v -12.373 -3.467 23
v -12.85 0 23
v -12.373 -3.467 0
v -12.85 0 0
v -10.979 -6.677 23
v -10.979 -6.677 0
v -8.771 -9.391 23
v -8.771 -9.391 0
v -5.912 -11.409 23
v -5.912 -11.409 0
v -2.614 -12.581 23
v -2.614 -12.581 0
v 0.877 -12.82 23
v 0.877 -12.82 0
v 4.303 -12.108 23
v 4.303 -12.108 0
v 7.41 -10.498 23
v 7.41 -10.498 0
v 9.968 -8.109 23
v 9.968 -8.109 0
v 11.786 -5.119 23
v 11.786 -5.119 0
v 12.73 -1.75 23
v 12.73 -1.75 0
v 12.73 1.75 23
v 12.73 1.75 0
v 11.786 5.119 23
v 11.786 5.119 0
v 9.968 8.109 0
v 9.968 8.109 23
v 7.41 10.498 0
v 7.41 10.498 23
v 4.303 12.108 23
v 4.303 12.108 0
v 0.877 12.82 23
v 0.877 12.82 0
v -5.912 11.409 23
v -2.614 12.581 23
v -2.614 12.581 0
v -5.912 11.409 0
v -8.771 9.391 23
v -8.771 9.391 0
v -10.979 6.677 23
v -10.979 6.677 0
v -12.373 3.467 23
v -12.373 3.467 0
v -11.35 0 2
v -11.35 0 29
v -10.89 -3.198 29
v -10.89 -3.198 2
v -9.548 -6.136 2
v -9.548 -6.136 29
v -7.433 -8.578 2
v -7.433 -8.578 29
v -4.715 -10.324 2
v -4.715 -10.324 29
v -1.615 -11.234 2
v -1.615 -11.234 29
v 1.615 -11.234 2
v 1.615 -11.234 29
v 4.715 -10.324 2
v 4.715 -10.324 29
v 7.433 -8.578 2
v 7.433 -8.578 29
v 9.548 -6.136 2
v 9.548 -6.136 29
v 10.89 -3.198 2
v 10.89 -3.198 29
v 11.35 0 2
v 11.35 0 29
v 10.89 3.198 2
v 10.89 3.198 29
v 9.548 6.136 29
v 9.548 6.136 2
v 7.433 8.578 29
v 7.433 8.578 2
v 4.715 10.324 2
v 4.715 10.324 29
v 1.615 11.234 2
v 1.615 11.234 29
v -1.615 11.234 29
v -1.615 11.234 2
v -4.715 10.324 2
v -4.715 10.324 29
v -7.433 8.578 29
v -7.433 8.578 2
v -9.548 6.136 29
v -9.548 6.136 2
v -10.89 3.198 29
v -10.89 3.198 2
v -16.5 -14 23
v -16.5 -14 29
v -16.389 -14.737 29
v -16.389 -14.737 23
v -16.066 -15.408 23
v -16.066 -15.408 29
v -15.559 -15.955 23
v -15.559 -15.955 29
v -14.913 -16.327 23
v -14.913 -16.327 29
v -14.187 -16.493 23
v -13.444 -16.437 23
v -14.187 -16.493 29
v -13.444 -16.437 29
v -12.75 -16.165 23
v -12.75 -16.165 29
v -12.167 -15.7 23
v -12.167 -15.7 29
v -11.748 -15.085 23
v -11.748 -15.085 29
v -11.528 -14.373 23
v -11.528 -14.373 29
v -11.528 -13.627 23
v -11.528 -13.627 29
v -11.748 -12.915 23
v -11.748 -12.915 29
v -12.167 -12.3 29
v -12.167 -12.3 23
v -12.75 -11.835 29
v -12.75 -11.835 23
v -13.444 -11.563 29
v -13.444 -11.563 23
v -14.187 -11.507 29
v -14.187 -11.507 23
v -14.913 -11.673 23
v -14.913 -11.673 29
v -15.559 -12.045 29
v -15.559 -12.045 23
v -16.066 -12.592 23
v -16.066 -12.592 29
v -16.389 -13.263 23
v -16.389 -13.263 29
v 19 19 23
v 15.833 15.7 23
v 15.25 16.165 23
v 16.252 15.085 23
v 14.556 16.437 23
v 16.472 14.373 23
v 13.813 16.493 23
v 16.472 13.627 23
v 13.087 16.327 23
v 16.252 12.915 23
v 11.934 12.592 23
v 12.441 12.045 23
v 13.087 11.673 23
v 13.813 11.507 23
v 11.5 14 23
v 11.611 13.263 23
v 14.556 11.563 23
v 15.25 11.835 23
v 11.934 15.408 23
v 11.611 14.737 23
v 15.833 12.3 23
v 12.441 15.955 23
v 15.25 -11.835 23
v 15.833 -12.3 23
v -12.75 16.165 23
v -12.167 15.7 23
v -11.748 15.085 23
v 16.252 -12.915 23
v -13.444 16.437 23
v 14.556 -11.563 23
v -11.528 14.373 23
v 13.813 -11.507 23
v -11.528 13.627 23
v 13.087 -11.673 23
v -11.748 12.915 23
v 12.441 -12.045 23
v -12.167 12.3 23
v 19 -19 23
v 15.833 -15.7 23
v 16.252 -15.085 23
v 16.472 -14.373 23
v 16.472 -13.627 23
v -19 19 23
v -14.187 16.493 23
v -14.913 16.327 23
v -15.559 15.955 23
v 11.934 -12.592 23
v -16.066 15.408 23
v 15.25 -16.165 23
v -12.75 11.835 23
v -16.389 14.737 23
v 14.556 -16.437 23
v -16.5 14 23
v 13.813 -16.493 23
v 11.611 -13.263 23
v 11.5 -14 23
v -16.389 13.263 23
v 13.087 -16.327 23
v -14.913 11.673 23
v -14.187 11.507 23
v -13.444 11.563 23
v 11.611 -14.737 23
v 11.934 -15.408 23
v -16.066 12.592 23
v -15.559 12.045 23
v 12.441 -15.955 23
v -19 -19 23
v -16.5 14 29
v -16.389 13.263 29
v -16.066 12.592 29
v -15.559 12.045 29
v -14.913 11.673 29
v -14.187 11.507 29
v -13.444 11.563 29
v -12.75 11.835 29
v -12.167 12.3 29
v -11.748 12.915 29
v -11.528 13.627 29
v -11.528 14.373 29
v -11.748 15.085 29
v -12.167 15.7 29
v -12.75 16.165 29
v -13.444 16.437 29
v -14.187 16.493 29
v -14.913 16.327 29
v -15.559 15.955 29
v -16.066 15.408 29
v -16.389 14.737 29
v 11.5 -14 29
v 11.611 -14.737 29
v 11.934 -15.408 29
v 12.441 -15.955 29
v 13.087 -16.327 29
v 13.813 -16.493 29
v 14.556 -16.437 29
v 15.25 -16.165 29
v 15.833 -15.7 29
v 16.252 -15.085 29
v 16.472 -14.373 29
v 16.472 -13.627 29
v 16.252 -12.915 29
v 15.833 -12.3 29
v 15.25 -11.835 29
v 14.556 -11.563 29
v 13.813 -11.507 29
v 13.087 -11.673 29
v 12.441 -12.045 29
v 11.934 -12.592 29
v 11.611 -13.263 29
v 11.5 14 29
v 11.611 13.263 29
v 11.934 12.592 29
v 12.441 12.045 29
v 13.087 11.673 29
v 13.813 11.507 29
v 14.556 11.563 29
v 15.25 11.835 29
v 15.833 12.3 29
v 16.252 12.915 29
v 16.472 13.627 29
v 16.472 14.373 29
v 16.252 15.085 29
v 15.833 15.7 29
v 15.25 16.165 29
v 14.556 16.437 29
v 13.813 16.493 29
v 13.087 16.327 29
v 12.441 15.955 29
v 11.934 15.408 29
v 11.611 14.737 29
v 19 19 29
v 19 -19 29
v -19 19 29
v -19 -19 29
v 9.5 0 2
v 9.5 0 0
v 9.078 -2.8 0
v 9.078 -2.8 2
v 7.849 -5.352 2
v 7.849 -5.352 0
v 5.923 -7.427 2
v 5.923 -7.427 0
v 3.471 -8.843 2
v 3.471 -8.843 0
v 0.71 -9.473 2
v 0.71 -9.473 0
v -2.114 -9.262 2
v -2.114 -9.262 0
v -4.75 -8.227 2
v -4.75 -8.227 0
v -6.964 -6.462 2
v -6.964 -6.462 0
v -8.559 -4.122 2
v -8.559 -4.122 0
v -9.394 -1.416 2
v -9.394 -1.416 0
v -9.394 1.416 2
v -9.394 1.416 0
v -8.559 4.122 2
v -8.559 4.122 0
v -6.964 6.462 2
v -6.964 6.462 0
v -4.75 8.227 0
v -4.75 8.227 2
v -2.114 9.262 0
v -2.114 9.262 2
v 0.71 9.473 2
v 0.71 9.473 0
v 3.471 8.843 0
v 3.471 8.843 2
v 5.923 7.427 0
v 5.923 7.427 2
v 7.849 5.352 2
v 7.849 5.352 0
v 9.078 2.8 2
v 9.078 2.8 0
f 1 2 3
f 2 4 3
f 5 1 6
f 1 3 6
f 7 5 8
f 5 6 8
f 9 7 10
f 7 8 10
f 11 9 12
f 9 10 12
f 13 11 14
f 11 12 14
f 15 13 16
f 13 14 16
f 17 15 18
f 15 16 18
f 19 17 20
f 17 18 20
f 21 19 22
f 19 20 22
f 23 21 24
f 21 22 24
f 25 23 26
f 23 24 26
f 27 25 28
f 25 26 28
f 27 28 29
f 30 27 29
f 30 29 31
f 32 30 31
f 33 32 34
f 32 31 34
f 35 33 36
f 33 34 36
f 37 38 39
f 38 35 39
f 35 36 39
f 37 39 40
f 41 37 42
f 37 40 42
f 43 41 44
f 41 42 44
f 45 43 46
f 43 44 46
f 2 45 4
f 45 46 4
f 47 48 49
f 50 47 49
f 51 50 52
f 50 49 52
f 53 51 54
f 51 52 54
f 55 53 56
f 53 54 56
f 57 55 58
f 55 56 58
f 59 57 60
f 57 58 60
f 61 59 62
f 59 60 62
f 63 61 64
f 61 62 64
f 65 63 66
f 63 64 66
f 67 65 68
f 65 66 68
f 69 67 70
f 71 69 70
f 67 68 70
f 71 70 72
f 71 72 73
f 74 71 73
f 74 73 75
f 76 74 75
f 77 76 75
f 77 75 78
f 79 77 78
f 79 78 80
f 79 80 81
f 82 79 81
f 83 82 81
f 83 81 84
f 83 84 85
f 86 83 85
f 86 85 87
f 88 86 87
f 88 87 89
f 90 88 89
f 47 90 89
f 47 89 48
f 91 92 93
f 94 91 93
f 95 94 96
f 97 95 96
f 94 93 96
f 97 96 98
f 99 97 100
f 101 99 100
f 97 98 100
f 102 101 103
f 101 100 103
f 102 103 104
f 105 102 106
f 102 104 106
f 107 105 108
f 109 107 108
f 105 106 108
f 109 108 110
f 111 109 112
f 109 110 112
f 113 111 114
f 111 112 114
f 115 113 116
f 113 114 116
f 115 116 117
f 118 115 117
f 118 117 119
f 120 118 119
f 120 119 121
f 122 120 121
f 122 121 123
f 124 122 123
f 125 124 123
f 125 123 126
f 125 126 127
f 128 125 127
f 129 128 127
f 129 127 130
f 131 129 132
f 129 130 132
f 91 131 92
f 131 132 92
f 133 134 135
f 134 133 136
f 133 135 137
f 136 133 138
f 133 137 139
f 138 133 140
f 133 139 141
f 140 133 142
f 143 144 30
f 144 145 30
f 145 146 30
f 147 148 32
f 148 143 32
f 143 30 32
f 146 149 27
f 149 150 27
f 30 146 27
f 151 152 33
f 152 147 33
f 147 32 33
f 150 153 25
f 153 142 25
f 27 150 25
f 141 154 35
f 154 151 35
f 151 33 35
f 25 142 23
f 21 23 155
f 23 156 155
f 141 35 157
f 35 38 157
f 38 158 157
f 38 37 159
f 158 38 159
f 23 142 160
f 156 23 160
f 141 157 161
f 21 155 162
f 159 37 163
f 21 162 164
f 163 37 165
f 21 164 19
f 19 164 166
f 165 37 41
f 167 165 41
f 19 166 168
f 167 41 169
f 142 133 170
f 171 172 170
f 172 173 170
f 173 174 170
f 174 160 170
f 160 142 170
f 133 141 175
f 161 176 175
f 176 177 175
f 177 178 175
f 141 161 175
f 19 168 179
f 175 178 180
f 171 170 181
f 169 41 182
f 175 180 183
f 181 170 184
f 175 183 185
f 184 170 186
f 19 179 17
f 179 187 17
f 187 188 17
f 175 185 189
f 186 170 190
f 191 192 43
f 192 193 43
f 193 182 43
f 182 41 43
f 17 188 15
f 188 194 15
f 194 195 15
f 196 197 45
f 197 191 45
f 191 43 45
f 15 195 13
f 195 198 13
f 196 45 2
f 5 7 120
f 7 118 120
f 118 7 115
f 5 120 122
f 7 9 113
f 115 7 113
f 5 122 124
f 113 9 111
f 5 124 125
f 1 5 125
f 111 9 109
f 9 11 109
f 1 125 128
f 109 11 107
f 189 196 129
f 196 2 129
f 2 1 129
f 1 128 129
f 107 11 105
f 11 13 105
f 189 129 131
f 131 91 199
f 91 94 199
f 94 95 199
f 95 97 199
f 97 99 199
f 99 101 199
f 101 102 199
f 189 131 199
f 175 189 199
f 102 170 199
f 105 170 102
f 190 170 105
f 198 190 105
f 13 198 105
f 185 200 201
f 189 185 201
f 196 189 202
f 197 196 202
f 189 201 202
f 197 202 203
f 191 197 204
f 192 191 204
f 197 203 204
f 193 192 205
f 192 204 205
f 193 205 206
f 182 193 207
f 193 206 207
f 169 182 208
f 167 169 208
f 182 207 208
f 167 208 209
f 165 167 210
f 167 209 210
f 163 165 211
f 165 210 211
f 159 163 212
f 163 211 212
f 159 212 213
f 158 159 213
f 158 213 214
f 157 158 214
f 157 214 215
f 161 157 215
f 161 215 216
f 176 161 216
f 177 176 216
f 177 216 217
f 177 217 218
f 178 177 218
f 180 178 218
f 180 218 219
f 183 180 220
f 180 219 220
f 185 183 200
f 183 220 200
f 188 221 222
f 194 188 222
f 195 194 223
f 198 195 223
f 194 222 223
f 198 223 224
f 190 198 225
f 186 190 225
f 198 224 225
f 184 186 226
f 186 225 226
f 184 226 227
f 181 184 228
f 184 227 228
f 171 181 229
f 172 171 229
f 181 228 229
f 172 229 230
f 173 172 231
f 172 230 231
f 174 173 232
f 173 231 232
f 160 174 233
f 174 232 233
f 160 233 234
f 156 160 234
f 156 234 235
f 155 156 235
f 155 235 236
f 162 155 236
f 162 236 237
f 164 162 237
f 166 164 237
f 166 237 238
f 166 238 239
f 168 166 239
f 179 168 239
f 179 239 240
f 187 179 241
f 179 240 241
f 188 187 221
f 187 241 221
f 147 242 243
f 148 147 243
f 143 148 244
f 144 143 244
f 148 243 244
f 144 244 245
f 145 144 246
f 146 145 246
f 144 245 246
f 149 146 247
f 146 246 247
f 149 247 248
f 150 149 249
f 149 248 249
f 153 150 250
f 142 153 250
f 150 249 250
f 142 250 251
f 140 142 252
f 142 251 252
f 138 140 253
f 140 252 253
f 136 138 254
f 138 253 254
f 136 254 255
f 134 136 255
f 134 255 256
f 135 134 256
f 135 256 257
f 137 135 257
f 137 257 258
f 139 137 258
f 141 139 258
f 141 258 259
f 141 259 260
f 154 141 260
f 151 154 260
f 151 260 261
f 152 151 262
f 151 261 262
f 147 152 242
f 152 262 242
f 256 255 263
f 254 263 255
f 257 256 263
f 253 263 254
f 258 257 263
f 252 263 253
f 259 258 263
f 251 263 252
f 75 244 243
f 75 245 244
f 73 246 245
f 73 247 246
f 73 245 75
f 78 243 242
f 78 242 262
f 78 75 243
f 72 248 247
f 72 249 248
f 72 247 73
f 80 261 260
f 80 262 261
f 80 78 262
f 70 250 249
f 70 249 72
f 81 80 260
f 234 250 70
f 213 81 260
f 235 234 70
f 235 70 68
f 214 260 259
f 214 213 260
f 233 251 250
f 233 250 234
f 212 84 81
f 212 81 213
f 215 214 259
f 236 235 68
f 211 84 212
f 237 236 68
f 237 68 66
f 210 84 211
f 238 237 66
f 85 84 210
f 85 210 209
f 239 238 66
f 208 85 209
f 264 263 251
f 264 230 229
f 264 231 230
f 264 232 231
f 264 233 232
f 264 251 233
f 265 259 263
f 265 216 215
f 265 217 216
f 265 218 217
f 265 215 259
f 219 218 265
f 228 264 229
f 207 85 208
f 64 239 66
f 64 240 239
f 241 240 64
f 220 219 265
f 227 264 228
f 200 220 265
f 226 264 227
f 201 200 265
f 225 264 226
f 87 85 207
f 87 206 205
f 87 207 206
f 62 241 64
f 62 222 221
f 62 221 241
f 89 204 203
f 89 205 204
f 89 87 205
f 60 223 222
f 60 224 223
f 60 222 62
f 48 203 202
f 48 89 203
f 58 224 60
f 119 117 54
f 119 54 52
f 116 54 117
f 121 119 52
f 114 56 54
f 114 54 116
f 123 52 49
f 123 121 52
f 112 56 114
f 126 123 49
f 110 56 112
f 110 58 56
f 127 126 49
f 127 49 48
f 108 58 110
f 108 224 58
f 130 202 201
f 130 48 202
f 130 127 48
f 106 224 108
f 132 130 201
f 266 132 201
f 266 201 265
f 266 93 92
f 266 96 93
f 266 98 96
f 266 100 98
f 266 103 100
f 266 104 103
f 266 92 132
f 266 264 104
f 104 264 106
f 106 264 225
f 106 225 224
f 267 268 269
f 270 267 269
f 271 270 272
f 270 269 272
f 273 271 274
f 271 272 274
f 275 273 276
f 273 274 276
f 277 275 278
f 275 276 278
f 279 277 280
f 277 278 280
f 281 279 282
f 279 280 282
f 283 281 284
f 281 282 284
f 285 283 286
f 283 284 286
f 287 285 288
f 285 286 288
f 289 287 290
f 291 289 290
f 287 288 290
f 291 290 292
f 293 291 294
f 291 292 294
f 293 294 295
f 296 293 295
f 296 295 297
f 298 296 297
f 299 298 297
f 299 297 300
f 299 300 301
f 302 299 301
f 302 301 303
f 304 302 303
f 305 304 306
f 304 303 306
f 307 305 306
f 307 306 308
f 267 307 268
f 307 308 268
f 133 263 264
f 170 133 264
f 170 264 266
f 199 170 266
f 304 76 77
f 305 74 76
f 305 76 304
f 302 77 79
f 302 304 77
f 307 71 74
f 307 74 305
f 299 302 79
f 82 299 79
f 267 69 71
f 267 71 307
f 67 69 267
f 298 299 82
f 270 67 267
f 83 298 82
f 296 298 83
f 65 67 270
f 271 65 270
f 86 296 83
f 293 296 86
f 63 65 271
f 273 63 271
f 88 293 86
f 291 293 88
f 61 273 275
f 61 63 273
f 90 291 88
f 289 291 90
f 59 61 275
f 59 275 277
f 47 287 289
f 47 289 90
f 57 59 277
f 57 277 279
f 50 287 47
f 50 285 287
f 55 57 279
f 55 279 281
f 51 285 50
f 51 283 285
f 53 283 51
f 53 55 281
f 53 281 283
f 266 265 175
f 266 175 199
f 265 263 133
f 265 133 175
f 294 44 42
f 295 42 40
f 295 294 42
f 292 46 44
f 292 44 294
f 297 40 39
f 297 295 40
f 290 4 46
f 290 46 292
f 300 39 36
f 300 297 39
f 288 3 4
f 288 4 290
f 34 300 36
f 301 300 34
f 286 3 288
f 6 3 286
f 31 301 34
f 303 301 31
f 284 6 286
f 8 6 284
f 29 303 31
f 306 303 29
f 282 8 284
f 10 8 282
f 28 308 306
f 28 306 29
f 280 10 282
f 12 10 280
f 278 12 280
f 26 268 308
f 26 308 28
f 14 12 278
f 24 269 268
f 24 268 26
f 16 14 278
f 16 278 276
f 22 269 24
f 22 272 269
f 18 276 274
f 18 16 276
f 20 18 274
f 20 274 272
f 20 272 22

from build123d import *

# Parameters (mm, degrees)
SKETCH001_R   = 9.5
POCKET_DEPTH  = 2
SKETCH002_W   = 38
SKETCH002_H   = 38
SKETCH002_R   = 11.35
SKETCH002_R_2 = 2.5
PAD_DEPTH     = 6


with BuildPart() as part:
    # Sketch → Revolution (revolve)
    with BuildSketch(Plane.XZ):
        Polygon((-11.35, 27), (-11.35, 2), (0, 2), (0, 0), (-12.85, 0), (-12.85, 27), (-12.85, 29), (-11.35, 29), align=None)
    revolve(axis=Axis((0, 0, 0), (0, 0, 1)))

    # Sketch001 (on Face3 of Revolution) → Pocket (cut)
    with BuildSketch(Plane(origin=(0, 0, 0), x_dir=(1, 0, 0), z_dir=(0, 0, -1))):
        Circle(SKETCH001_R)
    extrude(amount=-POCKET_DEPTH, mode=Mode.SUBTRACT)

    # Sketch002 (on Face4 of Pocket) → Pad (join)
    with BuildSketch(Plane(origin=(0, 0, 29), x_dir=(-1, 0, 0), z_dir=(0, 0, 1))):
        Rectangle(SKETCH002_W, SKETCH002_H)
        Circle(SKETCH002_R, mode=Mode.SUBTRACT)
        with Locations((-14, 14)):
            Circle(SKETCH002_R_2, mode=Mode.SUBTRACT)
        with Locations((14, 14)):
            Circle(SKETCH002_R_2, mode=Mode.SUBTRACT)
        with Locations((14, -14)):
            Circle(SKETCH002_R_2, mode=Mode.SUBTRACT)
        with Locations((-14, -14)):
            Circle(SKETCH002_R_2, mode=Mode.SUBTRACT)
    extrude(amount=-PAD_DEPTH)


solid = part.part
